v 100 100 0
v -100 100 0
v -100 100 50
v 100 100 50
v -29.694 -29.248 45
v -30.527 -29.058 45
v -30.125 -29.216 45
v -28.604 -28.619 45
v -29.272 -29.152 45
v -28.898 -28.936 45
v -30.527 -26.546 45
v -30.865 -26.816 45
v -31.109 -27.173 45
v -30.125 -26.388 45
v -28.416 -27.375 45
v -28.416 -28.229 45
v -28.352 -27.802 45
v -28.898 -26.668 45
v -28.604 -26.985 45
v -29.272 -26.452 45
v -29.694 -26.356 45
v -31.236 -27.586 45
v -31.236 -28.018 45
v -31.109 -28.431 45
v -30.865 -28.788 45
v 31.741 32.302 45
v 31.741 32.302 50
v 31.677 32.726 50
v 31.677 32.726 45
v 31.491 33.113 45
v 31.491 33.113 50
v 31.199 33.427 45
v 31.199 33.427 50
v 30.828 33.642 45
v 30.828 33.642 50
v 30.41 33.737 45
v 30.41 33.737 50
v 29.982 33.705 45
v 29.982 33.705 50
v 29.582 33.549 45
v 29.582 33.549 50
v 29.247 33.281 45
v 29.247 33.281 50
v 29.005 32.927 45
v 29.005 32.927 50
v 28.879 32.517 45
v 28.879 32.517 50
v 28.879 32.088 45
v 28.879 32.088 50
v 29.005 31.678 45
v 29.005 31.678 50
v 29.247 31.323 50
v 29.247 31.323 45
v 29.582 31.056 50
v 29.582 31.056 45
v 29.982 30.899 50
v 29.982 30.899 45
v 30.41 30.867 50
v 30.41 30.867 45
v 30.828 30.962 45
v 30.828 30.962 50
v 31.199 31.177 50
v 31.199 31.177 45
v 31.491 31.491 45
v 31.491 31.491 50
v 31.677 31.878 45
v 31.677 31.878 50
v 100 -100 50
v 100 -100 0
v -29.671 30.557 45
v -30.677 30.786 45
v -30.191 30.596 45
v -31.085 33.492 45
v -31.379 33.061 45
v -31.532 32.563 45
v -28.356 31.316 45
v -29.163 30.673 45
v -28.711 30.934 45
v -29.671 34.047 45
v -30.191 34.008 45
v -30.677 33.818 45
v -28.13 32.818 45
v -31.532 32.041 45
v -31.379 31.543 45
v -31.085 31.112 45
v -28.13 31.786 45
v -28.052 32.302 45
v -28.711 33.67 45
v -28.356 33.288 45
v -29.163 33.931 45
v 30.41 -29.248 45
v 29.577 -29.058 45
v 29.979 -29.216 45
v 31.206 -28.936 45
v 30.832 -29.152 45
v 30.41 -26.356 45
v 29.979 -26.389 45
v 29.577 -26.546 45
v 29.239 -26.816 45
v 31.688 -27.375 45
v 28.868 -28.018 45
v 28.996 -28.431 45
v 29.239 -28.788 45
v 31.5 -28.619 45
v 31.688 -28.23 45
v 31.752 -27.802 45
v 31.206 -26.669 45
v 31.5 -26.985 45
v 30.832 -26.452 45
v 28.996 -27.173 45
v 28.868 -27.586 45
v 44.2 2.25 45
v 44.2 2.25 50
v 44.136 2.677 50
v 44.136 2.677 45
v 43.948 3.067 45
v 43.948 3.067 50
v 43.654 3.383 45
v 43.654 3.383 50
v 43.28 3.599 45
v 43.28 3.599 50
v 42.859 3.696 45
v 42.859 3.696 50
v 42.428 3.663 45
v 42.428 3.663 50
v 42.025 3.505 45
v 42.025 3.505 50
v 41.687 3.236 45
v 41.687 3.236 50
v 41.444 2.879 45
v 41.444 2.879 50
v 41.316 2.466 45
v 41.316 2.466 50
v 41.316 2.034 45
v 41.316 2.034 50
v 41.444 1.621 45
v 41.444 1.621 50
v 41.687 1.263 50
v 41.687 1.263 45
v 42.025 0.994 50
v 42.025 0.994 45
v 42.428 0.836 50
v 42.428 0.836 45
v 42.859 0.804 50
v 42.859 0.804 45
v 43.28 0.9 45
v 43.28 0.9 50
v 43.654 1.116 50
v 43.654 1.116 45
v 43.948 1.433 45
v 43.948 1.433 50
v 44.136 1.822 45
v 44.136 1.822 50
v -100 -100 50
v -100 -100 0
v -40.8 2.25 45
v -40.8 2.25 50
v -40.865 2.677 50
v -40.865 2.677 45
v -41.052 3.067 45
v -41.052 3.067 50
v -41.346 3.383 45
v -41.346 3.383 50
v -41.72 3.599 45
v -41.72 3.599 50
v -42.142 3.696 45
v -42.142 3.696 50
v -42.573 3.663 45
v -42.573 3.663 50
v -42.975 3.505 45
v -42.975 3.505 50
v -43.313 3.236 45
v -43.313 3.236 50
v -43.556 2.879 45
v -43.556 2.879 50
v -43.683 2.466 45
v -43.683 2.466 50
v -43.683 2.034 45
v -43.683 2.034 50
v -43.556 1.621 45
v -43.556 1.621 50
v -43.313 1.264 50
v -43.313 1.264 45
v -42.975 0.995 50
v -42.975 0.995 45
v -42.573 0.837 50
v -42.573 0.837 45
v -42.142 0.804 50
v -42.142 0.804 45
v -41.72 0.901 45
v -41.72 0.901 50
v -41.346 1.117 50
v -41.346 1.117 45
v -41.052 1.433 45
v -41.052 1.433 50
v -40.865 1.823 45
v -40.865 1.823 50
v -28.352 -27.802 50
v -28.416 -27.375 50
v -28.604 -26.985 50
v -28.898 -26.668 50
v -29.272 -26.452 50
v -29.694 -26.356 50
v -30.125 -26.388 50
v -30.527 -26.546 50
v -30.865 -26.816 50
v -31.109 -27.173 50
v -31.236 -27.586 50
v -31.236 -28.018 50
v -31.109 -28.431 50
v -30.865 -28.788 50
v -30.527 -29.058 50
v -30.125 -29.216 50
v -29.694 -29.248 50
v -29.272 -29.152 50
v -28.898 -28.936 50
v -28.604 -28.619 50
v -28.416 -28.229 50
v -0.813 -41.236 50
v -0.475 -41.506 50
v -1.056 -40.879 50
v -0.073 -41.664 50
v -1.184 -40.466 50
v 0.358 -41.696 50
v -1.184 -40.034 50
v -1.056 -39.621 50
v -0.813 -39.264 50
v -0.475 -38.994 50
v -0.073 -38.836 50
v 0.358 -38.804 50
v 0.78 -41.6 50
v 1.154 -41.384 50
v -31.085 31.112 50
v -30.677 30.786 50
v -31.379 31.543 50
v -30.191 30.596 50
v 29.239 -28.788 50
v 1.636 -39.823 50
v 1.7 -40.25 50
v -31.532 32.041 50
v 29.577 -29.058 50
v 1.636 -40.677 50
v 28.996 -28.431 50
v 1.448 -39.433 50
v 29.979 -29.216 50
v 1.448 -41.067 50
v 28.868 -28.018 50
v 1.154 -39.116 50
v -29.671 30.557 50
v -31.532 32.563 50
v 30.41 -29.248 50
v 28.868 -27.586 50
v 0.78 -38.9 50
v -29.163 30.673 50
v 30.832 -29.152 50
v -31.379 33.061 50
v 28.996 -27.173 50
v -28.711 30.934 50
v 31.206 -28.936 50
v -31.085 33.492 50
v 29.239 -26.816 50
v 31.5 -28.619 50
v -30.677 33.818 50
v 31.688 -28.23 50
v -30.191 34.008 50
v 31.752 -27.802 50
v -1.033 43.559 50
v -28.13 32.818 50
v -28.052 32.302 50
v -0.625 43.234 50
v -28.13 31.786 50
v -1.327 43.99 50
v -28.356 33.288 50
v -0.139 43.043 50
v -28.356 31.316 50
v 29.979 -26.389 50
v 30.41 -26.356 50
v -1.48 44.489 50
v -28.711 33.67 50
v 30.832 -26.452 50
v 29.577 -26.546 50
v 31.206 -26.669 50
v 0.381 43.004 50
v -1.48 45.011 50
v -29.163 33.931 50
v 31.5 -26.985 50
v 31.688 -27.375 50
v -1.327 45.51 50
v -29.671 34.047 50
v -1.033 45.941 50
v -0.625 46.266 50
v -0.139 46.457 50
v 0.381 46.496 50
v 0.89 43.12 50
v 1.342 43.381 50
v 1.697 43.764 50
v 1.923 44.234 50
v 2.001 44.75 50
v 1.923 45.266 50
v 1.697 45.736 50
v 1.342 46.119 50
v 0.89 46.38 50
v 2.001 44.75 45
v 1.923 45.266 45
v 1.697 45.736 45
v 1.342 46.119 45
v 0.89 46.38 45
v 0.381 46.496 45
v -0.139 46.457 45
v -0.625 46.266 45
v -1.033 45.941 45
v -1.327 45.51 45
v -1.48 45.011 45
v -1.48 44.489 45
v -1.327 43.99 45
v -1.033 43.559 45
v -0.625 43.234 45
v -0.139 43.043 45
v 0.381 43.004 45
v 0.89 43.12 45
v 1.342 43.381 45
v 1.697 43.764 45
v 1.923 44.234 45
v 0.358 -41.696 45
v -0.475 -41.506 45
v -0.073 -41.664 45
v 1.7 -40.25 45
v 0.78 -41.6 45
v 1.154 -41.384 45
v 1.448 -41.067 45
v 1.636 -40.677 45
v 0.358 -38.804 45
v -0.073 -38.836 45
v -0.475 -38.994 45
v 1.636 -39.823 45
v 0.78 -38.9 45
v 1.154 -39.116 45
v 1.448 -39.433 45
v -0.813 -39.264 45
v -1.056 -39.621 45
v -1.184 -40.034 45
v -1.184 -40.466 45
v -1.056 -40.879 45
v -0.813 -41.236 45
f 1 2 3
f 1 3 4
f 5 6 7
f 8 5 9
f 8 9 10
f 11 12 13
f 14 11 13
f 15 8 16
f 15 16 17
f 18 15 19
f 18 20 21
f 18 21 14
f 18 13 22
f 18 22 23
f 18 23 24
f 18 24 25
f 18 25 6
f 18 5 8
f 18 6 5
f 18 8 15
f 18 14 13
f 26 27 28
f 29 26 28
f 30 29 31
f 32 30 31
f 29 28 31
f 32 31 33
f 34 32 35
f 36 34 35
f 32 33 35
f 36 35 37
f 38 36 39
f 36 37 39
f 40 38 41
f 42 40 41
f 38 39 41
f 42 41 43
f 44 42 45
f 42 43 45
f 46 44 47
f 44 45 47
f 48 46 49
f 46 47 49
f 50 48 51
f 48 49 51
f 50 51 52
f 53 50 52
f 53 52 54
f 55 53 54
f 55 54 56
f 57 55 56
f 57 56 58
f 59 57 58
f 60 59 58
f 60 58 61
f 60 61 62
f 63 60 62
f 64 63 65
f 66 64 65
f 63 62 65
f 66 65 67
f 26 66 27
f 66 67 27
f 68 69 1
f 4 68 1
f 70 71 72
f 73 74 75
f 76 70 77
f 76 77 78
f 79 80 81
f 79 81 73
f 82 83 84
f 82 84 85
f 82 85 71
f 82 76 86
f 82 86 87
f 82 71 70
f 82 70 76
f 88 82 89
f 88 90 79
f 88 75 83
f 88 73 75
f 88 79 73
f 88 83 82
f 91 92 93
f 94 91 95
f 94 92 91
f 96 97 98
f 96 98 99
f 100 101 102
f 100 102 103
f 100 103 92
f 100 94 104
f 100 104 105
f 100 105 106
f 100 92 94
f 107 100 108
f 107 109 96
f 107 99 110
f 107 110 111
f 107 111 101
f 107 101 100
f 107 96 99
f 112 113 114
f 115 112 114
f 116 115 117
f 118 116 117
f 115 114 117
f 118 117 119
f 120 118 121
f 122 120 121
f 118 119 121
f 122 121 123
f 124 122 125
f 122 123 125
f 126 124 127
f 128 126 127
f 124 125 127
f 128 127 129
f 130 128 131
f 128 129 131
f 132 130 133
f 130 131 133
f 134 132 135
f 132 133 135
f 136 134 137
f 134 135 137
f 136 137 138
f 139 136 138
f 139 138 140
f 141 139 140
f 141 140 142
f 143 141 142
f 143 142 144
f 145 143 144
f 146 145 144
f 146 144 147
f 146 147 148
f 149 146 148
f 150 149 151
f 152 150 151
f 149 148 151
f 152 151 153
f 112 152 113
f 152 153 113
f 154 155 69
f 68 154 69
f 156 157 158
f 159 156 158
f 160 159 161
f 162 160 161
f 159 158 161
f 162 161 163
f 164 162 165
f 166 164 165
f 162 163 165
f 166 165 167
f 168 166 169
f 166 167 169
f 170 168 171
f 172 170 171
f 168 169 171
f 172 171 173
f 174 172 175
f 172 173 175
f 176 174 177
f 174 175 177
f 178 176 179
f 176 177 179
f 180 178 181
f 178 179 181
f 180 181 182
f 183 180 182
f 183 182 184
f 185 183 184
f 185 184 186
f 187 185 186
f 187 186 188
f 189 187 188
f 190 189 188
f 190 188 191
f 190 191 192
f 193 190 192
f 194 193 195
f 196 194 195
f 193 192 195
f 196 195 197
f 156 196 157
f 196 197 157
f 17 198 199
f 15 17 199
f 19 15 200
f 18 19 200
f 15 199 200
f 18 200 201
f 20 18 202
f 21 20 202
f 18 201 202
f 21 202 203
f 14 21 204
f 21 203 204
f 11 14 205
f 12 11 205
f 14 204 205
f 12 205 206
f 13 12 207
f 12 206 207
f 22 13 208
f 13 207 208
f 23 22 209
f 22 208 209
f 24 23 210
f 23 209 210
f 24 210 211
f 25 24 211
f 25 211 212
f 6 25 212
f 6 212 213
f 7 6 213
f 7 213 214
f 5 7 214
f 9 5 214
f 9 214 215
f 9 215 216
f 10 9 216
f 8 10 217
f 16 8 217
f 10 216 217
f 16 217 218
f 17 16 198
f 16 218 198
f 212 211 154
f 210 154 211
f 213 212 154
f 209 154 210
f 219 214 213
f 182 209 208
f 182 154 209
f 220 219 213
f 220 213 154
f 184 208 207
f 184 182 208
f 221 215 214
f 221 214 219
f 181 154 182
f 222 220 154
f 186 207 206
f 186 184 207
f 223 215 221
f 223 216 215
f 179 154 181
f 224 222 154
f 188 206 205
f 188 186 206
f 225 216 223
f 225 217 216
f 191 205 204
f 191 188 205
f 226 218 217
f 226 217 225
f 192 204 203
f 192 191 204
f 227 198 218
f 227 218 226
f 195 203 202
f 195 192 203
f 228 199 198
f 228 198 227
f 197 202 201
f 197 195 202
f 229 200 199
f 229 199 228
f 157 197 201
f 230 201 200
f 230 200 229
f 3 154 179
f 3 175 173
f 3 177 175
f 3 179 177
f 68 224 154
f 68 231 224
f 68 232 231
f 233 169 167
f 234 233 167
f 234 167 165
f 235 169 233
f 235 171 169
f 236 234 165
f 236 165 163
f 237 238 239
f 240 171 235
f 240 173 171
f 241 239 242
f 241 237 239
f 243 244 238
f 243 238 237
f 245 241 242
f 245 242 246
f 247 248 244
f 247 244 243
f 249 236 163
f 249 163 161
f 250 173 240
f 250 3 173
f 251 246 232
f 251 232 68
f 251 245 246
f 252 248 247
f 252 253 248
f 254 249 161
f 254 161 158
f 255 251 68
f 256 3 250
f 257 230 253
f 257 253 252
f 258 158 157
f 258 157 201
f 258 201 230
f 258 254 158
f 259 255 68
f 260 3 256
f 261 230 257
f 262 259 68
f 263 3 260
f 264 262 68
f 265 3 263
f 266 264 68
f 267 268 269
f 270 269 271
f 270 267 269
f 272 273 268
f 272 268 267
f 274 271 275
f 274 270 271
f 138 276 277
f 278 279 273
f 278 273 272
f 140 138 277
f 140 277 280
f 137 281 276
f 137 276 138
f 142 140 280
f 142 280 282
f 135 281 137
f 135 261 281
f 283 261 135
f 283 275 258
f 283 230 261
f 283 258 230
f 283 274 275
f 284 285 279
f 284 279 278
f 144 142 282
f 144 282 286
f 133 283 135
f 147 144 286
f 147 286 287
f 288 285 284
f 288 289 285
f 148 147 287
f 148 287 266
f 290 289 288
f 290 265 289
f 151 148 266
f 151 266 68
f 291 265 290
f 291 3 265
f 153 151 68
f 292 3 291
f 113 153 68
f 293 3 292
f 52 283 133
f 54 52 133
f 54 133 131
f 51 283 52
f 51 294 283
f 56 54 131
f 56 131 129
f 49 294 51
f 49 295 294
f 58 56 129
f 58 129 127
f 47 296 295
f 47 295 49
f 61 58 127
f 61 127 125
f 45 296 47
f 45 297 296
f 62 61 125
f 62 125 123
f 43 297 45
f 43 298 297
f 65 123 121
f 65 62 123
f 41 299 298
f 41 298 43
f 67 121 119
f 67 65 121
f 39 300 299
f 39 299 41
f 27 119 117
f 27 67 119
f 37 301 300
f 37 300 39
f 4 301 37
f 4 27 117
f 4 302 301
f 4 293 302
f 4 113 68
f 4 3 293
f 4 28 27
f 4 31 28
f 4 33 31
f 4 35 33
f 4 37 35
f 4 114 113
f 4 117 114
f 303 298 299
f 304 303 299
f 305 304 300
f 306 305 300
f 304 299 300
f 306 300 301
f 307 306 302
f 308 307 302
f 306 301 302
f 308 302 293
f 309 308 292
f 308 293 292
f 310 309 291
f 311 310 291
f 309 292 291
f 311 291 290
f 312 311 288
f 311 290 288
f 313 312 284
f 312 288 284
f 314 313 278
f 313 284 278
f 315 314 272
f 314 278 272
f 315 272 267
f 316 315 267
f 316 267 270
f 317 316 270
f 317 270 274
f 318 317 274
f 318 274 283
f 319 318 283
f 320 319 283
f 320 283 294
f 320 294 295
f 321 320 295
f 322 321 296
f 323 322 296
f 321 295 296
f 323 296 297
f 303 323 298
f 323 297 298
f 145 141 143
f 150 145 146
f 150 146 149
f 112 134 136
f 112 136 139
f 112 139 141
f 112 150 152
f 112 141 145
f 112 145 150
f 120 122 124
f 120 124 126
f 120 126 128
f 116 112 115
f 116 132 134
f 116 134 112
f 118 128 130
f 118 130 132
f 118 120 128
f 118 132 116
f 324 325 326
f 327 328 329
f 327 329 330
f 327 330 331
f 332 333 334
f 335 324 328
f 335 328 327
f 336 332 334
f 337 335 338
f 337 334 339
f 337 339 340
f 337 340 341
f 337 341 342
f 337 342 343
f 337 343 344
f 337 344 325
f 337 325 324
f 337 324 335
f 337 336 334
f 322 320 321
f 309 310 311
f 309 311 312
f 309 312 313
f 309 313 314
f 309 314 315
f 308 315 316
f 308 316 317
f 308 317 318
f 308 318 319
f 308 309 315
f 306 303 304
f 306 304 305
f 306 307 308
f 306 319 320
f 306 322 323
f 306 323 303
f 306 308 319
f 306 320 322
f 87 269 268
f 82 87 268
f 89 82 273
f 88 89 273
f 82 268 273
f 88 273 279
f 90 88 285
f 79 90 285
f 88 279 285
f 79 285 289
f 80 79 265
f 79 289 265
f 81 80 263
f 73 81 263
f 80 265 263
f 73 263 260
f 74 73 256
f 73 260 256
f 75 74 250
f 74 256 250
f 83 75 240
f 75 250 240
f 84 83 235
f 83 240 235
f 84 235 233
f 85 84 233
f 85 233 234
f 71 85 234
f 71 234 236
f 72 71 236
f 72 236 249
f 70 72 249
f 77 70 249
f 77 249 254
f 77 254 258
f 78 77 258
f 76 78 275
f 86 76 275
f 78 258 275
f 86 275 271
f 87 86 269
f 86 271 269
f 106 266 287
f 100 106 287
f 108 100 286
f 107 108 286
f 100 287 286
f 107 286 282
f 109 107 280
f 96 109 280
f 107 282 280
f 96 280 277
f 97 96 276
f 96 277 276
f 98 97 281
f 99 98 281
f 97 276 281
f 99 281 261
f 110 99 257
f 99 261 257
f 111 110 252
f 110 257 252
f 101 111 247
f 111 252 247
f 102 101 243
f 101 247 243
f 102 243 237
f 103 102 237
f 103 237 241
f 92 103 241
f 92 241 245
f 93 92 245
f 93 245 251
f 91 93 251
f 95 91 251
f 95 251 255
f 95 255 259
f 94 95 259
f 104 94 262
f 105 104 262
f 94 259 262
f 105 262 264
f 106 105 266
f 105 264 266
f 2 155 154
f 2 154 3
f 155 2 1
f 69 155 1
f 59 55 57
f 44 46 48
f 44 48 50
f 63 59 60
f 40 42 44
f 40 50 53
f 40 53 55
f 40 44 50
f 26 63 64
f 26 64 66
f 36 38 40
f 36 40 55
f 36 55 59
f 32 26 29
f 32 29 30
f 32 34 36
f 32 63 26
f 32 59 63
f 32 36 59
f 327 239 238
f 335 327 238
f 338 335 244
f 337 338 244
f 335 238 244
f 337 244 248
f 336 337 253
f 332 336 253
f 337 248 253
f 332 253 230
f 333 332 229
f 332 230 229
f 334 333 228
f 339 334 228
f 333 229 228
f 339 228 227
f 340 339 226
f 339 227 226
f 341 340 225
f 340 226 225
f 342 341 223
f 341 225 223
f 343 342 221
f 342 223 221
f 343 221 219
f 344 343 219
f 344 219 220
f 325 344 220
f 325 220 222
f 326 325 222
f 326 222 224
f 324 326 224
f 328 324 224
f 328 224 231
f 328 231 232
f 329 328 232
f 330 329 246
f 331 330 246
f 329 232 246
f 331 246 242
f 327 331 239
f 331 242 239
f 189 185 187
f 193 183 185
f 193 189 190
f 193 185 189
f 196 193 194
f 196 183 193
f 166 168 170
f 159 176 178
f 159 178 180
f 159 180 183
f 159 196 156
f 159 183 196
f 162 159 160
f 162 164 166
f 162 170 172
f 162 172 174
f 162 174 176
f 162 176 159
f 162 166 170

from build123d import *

# Parameters (mm, degrees)
SKETCH_1_W          = 200
SKETCH_1_H          = 200
EXTRUDE_1_DEPTH     = 50
SKETCH_7_R          = 1.45
SKETCH_7_R_2        = 1.450147074
SKETCH_7_R_3        = 1.449615697
SKETCH_7_R_4        = 1.75
SKETCH_7_R_5        = 1.439370264
SKETCH_7_R_6        = 1.750543486
CUT_EXTRUDE_2_DEPTH = 5


with BuildPart() as part:
    # 草图1 → 凸台-拉伸1 (new body)
    with BuildSketch(Plane.XY):
        Rectangle(SKETCH_1_W, SKETCH_1_H)
    extrude(amount=EXTRUDE_1_DEPTH)

    # 草图7 → 切除-拉伸2 (cut)
    with BuildSketch(Plane.XY.offset(50)):
        with Locations((0.25, -40.25)):
            Circle(SKETCH_7_R)
        with Locations((-29.8020382, -27.8020382)):
            Circle(SKETCH_7_R_2)
        with Locations((-42.25, 2.25)):
            Circle(SKETCH_7_R_3)
        with Locations((-29.8020382, 32.3020382)):
            Circle(SKETCH_7_R_4)
        with Locations((42.750271742, 2.249728256)):
            Circle(SKETCH_7_R)
        with Locations((30.302117792, -27.802230352)):
            Circle(SKETCH_7_R)
        with Locations((30.302038201, 32.3020382)):
            Circle(SKETCH_7_R_5)
        with Locations((0.250543486, 44.749999998)):
            Circle(SKETCH_7_R_6)
    extrude(amount=-CUT_EXTRUDE_2_DEPTH, mode=Mode.SUBTRACT)


solid = part.part
